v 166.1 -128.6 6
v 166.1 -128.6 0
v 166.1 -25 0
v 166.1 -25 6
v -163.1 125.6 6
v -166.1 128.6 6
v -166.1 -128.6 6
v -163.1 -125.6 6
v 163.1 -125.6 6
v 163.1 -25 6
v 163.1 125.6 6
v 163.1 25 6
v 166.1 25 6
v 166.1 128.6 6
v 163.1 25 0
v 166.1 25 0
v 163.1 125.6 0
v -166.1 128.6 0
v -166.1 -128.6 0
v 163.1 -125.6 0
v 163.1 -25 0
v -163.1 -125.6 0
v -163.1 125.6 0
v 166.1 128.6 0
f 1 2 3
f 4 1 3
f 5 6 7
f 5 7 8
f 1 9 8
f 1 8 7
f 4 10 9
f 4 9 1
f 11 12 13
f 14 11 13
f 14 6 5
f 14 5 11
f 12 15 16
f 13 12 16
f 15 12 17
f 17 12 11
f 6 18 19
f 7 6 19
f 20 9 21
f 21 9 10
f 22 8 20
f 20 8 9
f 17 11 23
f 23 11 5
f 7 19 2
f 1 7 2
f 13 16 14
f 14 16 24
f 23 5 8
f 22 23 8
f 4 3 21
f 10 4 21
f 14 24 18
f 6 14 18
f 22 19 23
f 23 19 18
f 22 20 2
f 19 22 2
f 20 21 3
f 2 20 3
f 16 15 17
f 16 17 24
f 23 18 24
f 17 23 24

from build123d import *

# Parameters (mm, degrees)
IZIM1_W                     = 50
IZIM1_H                     = 50
IZIM1_H_2                   = 45
IZIM1_W_2                   = 45
Y_KSEKLIK_EKSTR_ZYON2_DEPTH = 5
IZIM2_R                     = 3
Y_KSEKLIK_EKSTR_ZYON3_DEPTH = 15
Y_KSEKLIK_EKSTR_ZYON4_DEPTH = 6
IZIM4_W                     = 15
IZIM4_H                     = 5
IZIM4_W_2                   = 5
IZIM4_H_2                   = 15
Y_KSEKLIK_EKSTR_ZYON5_DEPTH = 20
IZIM5_R                     = 2
KES_EKSTR_ZYON1_DEPTH       = 132.1
IZIM6_R                     = 2
KES_EKSTR_ZYON2_DEPTH       = 169.6
IZIM7_W                     = 393.876615126
IZIM7_H                     = 303.042246628
KES_EKSTR_ZYON3_DEPTH       = 26
KES_EKSTR_ZYON4_DEPTH       = 7


with BuildPart() as part:
    # Çizim1 → Yükseklik-Ekstrüzyon2 (new body)
    with BuildSketch(Plane.XY):
        Polygon((-35, -128.6), (-35, -116.312863708), (-52.209867178, -116.312863708), align=None)
        Polygon((-35, -116.312863708), (-148.890132822, -35), (-148.890132822, -47.287136292), (-52.209867178, -116.312863708), align=None)
        Polygon((-25, -35), (-35, -35), (-35, -116.312863708), (-35, -128.6), (35, -128.6), (35, -116.312863708), (35, -35), (25, -35), (25, -80), (25, -108.6), (-25, -108.6), (-25, -80), align=None)
        Polygon((-148.890132822, -47.287136292), (-166.1, -35), (-166.1, -128.6), (-35, -128.6), (-52.209867178, -116.312863708), (-148.890132822, -116.312863708), align=None)
        Polygon((-148.890132822, -35), (-166.1, -35), (-148.890132822, -47.287136292), align=None)
        Polygon((-35, 25), (-35, 35), (-148.890132822, 35), (-166.1, 35), (-166.1, -35), (-148.890132822, -35), (-35, -35), (-35, -25), (-80, -25), (-146.1, -25), (-146.1, 25), (-80, 25), align=None)
        Polygon((-25, 35), (-35, 35), (-35, 25), (-35, -25), (-35, -35), (-25, -35), (25, -35), (35, -35), (35, -25), (35, 25), (35, 35), (25, 35), align=None)
        Rectangle(IZIM1_W, IZIM1_H, mode=Mode.SUBTRACT)
        with Locations((0, -57.5)):
            Rectangle(IZIM1_W, IZIM1_H_2)
        Rectangle(IZIM1_W, IZIM1_H)
        with Locations((-57.5, 0)):
            Rectangle(IZIM1_W_2, IZIM1_H)
        with Locations((57.5, 0)):
            Rectangle(IZIM1_W_2, IZIM1_H)
        Polygon((148.890132822, 35), (35, 35), (35, 25), (80, 25), (146.1, 25), (146.1, -25), (80, -25), (35, -25), (35, -35), (148.890132822, -35), (166.1, -35), (166.1, 35), align=None)
        Polygon((148.890132822, -47.287136292), (148.890132822, -35), (35, -116.312863708), (52.209867178, -116.312863708), align=None)
        Polygon((148.890132822, -47.287136292), (166.1, -35), (148.890132822, -35), align=None)
        Polygon((166.1, -128.6), (166.1, -35), (148.890132822, -47.287136292), (148.890132822, -116.312863708), (52.209867178, -116.312863708), (35, -128.6), align=None)
        Polygon((52.209867178, -116.312863708), (35, -116.312863708), (35, -128.6), align=None)
        Polygon((52.209867178, 116.312863708), (35, 116.312863708), (148.890132822, 35), (148.890132822, 47.287136292), align=None)
        Polygon((148.890132822, 47.287136292), (148.890132822, 35), (166.1, 35), align=None)
        Polygon((166.1, 128.6), (35, 128.6), (52.209867178, 116.312863708), (148.890132822, 116.312863708), (148.890132822, 47.287136292), (166.1, 35), align=None)
        Polygon((52.209867178, 116.312863708), (35, 128.6), (35, 116.312863708), align=None)
        Polygon((35, 128.6), (-35, 128.6), (-35, 116.312863708), (-35, 35), (-25, 35), (-25, 80), (-25, 108.6), (25, 108.6), (25, 80), (25, 35), (35, 35), (35, 116.312863708), align=None)
        with Locations((0, 57.5)):
            Rectangle(IZIM1_W, IZIM1_H_2)
        Polygon((-35, 116.312863708), (-35, 128.6), (-52.209867178, 116.312863708), align=None)
        Polygon((-35, 116.312863708), (-52.209867178, 116.312863708), (-148.890132822, 47.287136292), (-148.890132822, 35), align=None)
        Polygon((-52.209867178, 116.312863708), (-35, 128.6), (-166.1, 128.6), (-166.1, 35), (-148.890132822, 47.287136292), (-148.890132822, 116.312863708), align=None)
        Polygon((-148.890132822, 35), (-148.890132822, 47.287136292), (-166.1, 35), align=None)
    extrude(amount=-Y_KSEKLIK_EKSTR_ZYON2_DEPTH)

    # Çizim2 → Yükseklik-Ekstrüzyon3 (add)
    with BuildSketch(Plane(origin=(0, 0, -5), x_dir=(-1, 0, 0), z_dir=(0, 0, -1))):
        Circle(IZIM2_R)
    extrude(amount=Y_KSEKLIK_EKSTR_ZYON3_DEPTH)

    # Çizim3 → Yükseklik-Ekstrüzyon4 (add)
    with BuildSketch(Plane.XY):
        Polygon((161.1, 123.6), (161.1, 25), (166.1, 25), (166.1, 128.6), (-166.1, 128.6), (-166.1, -128.6), (166.1, -128.6), (166.1, -25), (161.1, -25), (161.1, -123.6), (-161.1, -123.6), (-161.1, 123.6), align=None)
    extrude(amount=Y_KSEKLIK_EKSTR_ZYON4_DEPTH)

    # Çizim4 → Yükseklik-Ekstrüzyon5 (add)
    with BuildSketch(Plane(origin=(0, 0, -5), x_dir=(-1, 0, 0), z_dir=(0, 0, -1))):
        with Locations((-60, 0)):
            Rectangle(IZIM4_W, IZIM4_H)
        with Locations((0, -60)):
            Rectangle(IZIM4_W_2, IZIM4_H_2)
    extrude(amount=Y_KSEKLIK_EKSTR_ZYON5_DEPTH)

    # Çizim5 → Kes-Ekstrüzyon1 (cut, through all)
    with BuildSketch(Plane.XZ.offset(2.5)):
        with Locations((60, -10)):
            Circle(IZIM5_R)
        with Locations((60, -19)):
            Circle(IZIM5_R)
    extrude(amount=-KES_EKSTR_ZYON1_DEPTH, mode=Mode.SUBTRACT)

    # Çizim6 → Kes-Ekstrüzyon2 (cut, through all)
    with BuildSketch(Plane(origin=(2.5, 0, 0), x_dir=(0, 0, -1), z_dir=(1, 0, 0))):
        with Locations((10, -60)):
            Circle(IZIM6_R)
        with Locations((19, -60)):
            Circle(IZIM6_R)
    extrude(amount=-KES_EKSTR_ZYON2_DEPTH, mode=Mode.SUBTRACT)

    # Çizim7 → Kes-Ekstrüzyon3 (cut, through all)
    with BuildSketch(Plane.XY):
        with Locations((1.174582351, -1.957637252)):
            Rectangle(IZIM7_W, IZIM7_H)
    extrude(amount=-KES_EKSTR_ZYON3_DEPTH, mode=Mode.SUBTRACT)

    # Çizim8 → Kes-Ekstrüzyon4 (cut, through all)
    with BuildSketch(Plane.XY.offset(6)):
        Polygon((161.1, 25), (163.1, 25), (163.1, 125.6), (-163.1, 125.6), (-163.1, -125.6), (163.1, -125.6), (163.1, -25), (161.1, -25), (161.1, -123.6), (-161.1, -123.6), (-161.1, 123.6), (161.1, 123.6), align=None)
    extrude(amount=-KES_EKSTR_ZYON4_DEPTH, mode=Mode.SUBTRACT)


solid = part.part
